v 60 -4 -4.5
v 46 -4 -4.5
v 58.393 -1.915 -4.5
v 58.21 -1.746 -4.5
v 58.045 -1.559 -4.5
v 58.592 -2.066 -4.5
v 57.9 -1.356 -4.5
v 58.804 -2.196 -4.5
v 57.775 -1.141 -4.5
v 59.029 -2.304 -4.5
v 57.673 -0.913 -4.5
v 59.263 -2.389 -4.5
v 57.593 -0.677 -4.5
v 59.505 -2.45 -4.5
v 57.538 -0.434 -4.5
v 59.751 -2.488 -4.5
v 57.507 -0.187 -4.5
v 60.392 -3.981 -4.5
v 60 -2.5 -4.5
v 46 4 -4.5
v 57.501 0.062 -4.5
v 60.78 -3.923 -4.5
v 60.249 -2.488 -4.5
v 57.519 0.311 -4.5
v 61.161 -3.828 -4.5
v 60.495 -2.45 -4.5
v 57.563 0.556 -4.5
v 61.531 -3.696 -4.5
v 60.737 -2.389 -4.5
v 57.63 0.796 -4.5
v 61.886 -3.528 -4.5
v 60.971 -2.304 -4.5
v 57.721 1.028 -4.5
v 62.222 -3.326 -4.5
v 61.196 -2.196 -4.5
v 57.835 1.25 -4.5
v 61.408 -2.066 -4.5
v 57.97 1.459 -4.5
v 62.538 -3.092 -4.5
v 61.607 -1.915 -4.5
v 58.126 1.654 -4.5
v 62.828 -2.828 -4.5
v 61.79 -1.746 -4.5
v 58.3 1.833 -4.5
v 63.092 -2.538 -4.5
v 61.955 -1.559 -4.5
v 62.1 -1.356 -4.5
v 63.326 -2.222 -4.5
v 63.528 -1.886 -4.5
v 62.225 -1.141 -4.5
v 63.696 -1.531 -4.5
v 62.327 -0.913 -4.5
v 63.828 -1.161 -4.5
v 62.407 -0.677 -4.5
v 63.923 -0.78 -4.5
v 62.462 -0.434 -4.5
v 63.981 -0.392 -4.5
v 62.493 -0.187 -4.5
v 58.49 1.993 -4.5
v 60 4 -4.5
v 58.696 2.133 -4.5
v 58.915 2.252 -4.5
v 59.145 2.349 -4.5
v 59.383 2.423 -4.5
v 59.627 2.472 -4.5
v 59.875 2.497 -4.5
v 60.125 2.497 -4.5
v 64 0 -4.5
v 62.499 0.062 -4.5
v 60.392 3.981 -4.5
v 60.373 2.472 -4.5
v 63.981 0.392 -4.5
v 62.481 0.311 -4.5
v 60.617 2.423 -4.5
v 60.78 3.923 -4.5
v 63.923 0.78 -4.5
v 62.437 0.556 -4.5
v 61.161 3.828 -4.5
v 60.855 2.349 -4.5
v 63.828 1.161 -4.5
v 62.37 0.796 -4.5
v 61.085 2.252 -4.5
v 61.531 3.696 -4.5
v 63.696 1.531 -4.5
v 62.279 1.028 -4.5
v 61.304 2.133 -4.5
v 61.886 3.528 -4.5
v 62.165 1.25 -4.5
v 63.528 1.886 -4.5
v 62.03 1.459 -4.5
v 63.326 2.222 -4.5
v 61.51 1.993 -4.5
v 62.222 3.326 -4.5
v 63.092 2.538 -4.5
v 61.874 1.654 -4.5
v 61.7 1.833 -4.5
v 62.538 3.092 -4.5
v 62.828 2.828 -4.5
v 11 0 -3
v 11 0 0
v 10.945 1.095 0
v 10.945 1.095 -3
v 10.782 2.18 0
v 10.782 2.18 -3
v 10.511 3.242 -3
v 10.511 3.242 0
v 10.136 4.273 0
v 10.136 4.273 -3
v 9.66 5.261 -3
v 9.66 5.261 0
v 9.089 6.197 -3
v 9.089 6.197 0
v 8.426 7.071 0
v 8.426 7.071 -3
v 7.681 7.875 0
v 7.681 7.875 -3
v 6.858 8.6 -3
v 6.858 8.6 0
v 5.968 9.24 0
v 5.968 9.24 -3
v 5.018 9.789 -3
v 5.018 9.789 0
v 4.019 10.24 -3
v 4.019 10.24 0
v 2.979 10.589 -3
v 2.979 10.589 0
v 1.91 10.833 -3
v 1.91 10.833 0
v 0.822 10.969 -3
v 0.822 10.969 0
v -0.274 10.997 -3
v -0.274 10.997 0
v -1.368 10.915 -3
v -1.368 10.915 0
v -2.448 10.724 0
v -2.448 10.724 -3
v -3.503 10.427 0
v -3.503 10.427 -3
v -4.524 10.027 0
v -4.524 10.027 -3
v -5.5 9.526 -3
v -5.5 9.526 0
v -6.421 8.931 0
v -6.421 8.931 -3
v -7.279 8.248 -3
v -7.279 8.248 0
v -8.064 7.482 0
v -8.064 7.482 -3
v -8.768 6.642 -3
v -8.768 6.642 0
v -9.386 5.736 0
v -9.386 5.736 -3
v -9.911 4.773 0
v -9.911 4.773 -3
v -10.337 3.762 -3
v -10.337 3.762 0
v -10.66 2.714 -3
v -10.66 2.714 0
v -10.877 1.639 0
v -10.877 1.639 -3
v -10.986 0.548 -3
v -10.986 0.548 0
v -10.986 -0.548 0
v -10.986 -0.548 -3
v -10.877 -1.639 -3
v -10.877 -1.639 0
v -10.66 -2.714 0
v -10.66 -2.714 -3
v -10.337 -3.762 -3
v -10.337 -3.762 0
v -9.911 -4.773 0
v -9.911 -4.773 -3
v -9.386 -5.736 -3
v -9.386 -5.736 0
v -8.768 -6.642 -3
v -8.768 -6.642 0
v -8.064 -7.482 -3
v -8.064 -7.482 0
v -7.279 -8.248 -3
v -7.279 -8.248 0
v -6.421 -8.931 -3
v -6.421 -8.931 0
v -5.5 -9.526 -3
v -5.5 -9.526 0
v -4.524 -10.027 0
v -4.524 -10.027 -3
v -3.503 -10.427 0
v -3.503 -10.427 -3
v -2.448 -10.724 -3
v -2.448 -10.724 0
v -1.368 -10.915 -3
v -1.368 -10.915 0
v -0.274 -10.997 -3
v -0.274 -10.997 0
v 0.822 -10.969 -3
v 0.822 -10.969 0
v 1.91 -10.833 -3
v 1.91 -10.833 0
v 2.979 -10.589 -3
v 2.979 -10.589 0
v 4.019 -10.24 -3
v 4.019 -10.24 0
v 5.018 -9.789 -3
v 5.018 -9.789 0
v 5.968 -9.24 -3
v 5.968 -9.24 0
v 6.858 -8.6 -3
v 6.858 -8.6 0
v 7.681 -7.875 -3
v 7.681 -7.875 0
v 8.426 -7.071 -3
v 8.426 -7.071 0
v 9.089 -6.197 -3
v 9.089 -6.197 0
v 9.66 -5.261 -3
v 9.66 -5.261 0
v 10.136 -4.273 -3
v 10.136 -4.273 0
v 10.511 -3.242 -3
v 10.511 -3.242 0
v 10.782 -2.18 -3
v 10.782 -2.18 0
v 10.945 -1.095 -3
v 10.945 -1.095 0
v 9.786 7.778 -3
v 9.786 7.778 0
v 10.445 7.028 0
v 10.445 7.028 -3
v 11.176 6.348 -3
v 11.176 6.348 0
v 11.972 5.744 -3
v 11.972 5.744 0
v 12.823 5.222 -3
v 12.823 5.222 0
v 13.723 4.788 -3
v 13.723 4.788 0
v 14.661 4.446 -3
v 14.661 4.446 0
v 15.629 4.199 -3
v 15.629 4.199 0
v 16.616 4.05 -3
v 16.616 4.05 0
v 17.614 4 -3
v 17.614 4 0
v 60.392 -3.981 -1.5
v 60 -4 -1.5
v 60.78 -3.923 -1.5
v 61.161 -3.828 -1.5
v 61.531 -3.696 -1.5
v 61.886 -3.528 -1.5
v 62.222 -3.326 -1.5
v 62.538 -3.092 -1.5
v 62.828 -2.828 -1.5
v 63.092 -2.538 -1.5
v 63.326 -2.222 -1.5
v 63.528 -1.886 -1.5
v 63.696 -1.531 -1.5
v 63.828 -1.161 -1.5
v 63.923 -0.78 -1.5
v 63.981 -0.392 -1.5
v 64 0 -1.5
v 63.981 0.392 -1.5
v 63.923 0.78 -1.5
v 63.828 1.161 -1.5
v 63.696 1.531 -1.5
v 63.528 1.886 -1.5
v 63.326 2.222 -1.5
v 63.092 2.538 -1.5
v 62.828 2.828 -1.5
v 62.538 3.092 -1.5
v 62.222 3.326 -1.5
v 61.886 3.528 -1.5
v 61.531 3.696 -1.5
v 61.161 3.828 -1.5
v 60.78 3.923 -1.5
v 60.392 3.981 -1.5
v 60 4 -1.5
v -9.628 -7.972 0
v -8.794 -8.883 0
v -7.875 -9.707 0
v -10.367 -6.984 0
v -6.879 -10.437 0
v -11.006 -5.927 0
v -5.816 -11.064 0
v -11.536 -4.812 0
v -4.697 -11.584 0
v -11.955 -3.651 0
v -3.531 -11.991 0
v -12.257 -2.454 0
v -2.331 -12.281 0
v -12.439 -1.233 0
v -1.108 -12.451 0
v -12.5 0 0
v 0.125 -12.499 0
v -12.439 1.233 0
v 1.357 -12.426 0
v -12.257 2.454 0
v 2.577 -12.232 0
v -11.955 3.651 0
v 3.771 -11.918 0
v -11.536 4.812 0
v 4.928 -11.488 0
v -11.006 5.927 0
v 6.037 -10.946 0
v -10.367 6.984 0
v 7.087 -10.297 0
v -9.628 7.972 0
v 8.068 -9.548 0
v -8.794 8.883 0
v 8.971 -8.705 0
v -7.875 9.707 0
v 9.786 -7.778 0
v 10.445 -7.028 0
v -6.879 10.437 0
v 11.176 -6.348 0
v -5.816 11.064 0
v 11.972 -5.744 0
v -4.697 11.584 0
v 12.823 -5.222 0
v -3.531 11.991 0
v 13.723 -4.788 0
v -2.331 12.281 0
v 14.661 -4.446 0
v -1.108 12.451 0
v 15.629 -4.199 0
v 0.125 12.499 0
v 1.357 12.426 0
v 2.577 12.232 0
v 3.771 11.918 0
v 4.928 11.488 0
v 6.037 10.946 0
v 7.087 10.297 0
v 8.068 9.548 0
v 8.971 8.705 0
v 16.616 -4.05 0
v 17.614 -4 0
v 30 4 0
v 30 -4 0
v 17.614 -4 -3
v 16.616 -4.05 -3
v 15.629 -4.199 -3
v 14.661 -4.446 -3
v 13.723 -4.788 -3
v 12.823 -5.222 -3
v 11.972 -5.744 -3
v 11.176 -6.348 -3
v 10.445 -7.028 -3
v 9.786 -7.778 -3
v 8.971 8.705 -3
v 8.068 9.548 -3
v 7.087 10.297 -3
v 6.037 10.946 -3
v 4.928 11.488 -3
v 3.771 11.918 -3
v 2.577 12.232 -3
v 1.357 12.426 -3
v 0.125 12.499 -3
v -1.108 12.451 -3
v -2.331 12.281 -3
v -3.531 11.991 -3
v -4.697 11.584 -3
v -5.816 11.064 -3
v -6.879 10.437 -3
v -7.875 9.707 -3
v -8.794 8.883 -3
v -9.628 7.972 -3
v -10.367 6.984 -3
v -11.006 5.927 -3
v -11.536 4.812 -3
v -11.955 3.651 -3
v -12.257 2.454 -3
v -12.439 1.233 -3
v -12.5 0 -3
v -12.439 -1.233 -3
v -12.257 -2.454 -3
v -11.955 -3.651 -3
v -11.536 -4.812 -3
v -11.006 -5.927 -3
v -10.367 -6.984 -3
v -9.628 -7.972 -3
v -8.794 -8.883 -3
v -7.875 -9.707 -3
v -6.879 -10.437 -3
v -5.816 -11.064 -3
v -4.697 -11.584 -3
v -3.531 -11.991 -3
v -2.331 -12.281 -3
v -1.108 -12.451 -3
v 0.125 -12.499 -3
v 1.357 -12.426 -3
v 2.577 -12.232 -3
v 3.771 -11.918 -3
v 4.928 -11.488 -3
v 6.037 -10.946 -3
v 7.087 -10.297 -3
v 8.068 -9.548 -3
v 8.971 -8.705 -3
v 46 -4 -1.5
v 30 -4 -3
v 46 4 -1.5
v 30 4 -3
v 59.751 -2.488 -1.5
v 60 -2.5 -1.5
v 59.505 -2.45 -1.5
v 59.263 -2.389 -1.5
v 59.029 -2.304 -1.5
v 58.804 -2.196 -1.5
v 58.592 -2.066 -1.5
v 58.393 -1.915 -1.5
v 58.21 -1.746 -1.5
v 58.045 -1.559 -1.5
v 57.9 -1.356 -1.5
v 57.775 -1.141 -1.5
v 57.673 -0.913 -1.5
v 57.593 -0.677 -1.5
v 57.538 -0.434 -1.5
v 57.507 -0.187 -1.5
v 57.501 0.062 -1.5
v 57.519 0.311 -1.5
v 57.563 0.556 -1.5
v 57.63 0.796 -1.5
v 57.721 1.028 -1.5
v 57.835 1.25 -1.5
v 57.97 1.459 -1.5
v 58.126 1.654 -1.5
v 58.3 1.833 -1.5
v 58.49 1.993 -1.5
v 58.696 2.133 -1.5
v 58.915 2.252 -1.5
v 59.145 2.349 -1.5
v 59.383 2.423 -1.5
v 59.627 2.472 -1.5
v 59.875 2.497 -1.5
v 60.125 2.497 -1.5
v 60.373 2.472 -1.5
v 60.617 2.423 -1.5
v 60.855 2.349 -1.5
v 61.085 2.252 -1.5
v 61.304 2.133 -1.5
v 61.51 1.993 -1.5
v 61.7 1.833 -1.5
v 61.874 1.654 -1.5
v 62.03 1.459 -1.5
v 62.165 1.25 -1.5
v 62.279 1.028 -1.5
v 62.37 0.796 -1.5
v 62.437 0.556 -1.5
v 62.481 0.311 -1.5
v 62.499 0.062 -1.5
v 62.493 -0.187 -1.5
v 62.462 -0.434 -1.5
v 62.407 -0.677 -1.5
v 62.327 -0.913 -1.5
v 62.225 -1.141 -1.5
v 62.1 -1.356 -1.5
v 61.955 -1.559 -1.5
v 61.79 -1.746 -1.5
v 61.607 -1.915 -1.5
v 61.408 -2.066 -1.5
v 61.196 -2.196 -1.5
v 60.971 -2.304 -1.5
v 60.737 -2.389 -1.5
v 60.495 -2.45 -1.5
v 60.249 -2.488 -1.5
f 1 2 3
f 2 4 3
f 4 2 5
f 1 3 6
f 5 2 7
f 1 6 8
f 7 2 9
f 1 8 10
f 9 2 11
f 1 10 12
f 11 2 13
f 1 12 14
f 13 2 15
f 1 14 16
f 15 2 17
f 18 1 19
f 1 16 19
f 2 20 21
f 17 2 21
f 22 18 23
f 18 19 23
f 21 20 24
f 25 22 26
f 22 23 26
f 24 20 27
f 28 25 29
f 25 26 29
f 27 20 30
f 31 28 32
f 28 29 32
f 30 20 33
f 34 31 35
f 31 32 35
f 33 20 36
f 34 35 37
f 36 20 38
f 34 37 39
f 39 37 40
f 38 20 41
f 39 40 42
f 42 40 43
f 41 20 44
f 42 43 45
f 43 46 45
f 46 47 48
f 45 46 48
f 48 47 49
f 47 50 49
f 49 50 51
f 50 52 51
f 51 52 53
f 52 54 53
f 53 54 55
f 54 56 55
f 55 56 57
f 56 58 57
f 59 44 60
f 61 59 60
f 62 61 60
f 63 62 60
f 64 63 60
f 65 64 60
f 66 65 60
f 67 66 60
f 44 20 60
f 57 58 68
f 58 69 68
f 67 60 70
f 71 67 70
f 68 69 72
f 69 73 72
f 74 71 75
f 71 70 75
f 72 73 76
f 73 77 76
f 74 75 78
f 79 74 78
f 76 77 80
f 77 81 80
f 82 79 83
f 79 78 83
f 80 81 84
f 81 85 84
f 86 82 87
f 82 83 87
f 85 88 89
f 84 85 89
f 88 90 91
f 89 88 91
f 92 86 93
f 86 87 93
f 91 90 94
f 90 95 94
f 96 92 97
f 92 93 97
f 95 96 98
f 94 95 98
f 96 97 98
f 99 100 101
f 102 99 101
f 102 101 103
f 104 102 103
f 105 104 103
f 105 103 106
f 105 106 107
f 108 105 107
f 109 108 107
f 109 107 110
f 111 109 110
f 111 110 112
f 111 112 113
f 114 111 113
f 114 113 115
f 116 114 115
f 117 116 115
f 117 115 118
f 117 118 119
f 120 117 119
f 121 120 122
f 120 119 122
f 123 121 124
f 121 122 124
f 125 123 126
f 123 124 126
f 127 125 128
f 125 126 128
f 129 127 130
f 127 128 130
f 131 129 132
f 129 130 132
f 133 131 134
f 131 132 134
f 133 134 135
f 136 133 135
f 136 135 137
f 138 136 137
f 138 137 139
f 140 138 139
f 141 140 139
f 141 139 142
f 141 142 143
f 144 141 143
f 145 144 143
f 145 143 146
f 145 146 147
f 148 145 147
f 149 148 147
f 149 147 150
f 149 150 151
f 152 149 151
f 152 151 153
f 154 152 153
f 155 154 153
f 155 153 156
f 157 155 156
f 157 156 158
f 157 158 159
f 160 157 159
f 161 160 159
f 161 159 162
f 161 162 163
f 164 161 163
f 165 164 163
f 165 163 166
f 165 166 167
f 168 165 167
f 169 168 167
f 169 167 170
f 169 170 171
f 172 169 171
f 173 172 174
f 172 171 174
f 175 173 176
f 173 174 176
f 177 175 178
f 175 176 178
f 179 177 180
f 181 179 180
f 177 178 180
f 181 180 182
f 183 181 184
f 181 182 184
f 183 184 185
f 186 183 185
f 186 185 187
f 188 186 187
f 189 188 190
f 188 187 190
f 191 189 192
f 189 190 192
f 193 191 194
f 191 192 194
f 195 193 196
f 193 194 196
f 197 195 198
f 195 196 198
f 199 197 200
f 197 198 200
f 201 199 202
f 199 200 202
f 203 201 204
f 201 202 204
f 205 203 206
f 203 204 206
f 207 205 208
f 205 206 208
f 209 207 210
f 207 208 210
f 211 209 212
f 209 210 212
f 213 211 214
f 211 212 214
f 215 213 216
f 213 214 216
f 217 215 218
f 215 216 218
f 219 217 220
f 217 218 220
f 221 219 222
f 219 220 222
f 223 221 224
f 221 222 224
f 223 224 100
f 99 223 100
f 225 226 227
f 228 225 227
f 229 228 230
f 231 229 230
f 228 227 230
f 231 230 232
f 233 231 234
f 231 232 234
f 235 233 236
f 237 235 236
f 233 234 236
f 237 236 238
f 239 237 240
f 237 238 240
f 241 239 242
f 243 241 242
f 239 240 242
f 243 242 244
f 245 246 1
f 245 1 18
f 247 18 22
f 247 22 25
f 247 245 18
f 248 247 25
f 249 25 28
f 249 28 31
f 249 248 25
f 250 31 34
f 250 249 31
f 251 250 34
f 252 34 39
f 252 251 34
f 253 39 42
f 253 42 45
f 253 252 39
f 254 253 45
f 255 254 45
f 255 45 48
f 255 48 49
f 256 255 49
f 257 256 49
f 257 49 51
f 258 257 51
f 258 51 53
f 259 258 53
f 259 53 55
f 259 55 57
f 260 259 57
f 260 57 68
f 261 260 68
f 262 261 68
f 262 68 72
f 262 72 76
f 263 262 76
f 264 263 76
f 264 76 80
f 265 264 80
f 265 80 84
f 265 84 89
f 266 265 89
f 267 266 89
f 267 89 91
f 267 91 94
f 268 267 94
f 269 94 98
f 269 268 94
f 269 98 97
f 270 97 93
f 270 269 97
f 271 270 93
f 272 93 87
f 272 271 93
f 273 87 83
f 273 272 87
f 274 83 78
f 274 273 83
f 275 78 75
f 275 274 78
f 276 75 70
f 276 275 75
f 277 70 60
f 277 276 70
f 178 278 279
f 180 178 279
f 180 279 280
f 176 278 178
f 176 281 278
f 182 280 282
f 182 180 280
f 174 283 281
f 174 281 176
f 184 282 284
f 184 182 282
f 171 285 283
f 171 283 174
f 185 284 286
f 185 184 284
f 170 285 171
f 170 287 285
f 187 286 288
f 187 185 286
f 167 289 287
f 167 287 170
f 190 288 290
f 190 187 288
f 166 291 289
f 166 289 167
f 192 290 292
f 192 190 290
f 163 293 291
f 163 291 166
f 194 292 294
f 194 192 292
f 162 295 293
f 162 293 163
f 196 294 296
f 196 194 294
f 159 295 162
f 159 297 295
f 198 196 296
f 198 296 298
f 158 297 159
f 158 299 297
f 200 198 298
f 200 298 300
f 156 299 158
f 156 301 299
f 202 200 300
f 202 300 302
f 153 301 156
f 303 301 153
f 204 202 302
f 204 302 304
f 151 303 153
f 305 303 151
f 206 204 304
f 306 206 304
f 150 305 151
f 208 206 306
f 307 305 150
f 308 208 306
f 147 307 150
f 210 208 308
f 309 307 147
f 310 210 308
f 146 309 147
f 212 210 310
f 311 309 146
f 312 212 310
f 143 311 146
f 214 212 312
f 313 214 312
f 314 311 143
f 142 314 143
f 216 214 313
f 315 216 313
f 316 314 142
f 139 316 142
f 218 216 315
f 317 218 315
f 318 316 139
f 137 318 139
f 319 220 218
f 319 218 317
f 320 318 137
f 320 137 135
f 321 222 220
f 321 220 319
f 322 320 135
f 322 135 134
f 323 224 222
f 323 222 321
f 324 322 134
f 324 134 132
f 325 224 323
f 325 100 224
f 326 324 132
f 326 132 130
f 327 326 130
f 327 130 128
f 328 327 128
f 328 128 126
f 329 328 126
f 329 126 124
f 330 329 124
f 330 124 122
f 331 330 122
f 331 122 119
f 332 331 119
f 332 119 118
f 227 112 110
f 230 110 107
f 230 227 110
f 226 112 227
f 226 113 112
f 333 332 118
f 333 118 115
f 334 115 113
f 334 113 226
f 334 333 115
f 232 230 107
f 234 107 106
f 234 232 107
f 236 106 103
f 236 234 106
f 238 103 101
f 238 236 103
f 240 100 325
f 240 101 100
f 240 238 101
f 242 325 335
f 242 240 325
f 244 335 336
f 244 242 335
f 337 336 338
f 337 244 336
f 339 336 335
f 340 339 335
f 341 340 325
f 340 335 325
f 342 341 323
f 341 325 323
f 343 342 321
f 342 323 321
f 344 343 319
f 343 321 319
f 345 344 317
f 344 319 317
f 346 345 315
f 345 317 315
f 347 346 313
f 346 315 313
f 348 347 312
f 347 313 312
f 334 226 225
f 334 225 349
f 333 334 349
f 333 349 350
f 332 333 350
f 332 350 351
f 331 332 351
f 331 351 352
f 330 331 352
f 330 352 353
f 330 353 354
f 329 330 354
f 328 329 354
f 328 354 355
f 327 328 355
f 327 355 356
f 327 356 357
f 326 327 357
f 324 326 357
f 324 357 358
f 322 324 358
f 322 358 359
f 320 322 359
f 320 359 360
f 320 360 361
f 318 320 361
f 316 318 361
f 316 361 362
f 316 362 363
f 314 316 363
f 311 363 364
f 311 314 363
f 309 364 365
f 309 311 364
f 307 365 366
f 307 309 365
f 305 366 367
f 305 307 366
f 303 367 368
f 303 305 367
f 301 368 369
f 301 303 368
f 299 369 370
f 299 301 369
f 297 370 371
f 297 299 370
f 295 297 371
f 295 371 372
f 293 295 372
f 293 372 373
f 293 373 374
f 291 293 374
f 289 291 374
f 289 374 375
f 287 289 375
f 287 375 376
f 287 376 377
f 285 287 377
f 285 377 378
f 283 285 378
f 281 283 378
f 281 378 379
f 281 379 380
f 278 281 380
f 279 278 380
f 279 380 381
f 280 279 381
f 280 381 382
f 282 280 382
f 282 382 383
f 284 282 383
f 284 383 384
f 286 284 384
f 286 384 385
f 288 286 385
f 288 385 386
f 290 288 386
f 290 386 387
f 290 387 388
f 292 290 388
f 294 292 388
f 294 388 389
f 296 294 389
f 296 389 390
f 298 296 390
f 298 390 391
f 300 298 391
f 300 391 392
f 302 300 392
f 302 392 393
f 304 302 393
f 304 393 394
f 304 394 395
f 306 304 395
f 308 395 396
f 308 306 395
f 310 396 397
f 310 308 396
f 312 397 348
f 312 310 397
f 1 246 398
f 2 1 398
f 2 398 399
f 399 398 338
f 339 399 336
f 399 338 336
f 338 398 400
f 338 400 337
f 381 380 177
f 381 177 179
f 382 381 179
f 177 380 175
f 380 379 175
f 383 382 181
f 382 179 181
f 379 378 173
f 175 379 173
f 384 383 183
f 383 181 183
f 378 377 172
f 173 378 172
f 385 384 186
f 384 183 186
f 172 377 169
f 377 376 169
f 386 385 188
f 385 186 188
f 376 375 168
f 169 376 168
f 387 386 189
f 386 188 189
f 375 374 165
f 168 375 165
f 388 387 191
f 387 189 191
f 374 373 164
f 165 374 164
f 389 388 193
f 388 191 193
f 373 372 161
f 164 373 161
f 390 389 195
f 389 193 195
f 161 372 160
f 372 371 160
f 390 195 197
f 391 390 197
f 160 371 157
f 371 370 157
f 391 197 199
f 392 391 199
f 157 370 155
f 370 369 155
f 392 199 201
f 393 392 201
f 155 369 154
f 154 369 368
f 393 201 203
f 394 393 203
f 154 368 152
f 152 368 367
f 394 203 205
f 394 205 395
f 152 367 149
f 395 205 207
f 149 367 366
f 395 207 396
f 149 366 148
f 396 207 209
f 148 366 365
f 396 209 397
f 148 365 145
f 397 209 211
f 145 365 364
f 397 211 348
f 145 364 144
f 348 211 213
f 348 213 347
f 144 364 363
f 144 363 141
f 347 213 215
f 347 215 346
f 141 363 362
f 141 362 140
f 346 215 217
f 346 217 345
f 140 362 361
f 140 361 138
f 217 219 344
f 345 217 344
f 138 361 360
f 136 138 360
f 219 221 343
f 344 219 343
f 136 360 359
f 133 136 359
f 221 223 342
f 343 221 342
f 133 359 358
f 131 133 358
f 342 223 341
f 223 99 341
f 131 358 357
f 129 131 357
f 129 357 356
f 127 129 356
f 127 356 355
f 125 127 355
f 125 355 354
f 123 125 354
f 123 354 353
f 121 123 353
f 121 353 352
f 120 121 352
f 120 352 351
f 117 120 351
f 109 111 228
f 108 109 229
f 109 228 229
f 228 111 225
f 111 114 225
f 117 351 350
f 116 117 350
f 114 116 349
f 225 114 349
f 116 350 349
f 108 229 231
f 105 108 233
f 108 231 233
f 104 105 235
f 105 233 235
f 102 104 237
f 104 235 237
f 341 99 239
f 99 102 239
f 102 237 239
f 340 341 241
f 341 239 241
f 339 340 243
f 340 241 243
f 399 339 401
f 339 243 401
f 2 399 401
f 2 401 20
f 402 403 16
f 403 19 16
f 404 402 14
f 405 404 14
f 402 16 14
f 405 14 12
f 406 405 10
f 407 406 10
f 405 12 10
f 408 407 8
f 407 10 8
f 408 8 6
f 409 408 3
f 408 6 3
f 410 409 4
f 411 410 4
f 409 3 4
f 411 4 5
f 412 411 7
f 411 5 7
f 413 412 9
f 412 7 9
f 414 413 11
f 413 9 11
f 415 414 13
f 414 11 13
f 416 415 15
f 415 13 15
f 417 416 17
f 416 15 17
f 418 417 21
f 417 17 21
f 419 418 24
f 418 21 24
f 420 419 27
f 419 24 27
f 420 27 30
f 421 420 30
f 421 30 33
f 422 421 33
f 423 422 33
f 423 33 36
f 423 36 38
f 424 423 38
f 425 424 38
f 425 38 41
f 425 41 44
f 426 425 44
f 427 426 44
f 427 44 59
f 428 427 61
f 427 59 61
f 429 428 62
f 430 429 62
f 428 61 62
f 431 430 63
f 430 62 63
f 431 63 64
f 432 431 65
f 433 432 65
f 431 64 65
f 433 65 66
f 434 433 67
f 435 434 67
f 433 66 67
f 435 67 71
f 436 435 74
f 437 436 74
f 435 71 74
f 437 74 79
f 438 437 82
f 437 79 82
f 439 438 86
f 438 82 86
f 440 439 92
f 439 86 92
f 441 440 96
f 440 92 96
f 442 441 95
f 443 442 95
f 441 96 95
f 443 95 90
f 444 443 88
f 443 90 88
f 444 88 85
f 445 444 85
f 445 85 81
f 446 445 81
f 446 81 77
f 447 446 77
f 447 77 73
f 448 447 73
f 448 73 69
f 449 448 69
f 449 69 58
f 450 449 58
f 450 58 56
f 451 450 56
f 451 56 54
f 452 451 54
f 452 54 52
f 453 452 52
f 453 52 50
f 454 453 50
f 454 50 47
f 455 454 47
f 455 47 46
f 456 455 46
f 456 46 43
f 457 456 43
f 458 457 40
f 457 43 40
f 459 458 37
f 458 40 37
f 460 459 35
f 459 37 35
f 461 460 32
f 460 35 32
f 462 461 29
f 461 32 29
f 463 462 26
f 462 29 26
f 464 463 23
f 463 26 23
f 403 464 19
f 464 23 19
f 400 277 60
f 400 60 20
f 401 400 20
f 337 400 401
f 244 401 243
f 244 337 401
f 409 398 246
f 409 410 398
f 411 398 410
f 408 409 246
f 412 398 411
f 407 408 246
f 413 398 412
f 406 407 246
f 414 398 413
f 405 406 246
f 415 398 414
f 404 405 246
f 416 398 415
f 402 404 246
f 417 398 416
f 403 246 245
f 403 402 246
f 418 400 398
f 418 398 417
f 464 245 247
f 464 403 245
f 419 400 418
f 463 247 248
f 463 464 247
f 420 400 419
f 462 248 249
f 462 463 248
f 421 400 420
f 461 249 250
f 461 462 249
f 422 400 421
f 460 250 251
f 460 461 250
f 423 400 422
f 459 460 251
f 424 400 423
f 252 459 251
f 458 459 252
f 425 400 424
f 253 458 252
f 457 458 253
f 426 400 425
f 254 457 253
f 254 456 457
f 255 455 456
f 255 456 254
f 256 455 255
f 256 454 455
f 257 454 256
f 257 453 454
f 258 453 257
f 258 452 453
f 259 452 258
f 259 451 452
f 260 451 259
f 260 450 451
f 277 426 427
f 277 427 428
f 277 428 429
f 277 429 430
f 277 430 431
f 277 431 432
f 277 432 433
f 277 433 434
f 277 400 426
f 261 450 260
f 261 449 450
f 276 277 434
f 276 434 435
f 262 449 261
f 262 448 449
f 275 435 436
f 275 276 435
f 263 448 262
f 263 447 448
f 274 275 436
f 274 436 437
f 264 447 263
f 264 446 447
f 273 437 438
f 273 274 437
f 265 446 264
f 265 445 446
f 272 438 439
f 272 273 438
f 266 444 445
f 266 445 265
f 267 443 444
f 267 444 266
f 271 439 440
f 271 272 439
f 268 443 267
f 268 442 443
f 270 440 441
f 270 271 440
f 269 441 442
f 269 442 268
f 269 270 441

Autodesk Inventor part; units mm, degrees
ref_plane "YZ Plane" through (0, 0, 0) normal (1, 0, 0) x (0, 1, 0)
ref_plane "XY Plane" through (0, 0, 0) normal (0, 0, 1) x (1, 0, 0)
sketch "Sketch1" plane through (0, 0, 0) normal (0, 0, 1) x (1, 0, 0)
  arc A0 (9.7855, 7.7778) -> (9.7855, -7.7778) centre (0, 0) ccw
  circle A1 centre (0, 0) radius 11
  arc A2 (60, -4) -> (60, 4) centre (60, 0) ccw
  line L0 (60, 4) -> (17.6139, 4) construction
  line L1 (60, -4) -> (17.6139, -4) construction
  arc A3 (17.6139, -4) -> (9.7855, -7.7778) centre (17.6139, -14) ccw
  arc A4 (9.7855, 7.7778) -> (17.6139, 4) centre (17.6139, 14) ccw
  line L2 (30, 4) -> (30, -4) construction
  line L3 (17.6139, -4) -> (17.6139, 4)
  point P0 (11.8427, 4)
  point P1 (11.8427, -4)
  point P2 (-12.5, 0)
  point P3 (30, 0)
  dimension "d0" = 25
  dimension "d1" = 22
  dimension "d2" = 4
  dimension "d3" = 10
  dimension "d4" = 60
  dimension "d17" = 42.5
extrude "Extrusion1" add sketch "Sketch1" against normal blind 3
ref_plane "Work Plane3" through (0, 0, 0) normal (0, 1, 0) x (-1, 0, 0)
sketch "Sketch7" plane through (0, 0, 0) normal (0, 1, 0) x (-1, 0, 0)
  line L0 (-17.6139, 0) -> (-17.6139, -3) projected
  line L1 (-17.6139, -3) -> (-30, -3)
  line L2 (-30, -3) -> (-46, -4.5)
  line L3 (-46, -4.5) -> (-60, -4.5)
  line L4 (-60, -4.5) -> (-60, -1.5)
  line L5 (-60, -1.5) -> (-46, -1.5)
  line L6 (-46, -1.5) -> (-30, 0)
  line L7 (-30, 0) -> (-17.6139, 0)
  line L8 (-17.6139, -3) -> (-17.6139, 0)
  point P0 (0, 0)
  point P1 (-60, -3)
  dimension "d19" = 1.5
  dimension "d20" = 14
  dimension "d21" = 60
  dimension "d22" = 3
extrude "Extrusion3" add sketch "Sketch7" along normal mid plane 8
sketch "Sketch8" plane through (46, 4, -1.5) normal (0, 0, 1) x (1, 0, 0)
  line L0 (14, -8) -> (14, 0) projected
  arc A0 (14, -8) -> (14, 0) centre (14, -4) ccw
  point P0 (-46, -4)
  dimension "d25" = 4
extrude "Extrusion4" add sketch "Sketch8" against normal up to surface (3 mm away)
sketch "Sketch9" plane through (46, -4, -1.5) normal (0, 0, 1) x (1, 0, 0)
  arc A0 (14, 0) -> (14, 8) centre (14, 4) ccw projected
  point P0 (-46, 4)
hole "Hole1" at (60, 0, -1.5) direction (0, 0, -1) diameter 5 depth 3
properties part number "15B"
